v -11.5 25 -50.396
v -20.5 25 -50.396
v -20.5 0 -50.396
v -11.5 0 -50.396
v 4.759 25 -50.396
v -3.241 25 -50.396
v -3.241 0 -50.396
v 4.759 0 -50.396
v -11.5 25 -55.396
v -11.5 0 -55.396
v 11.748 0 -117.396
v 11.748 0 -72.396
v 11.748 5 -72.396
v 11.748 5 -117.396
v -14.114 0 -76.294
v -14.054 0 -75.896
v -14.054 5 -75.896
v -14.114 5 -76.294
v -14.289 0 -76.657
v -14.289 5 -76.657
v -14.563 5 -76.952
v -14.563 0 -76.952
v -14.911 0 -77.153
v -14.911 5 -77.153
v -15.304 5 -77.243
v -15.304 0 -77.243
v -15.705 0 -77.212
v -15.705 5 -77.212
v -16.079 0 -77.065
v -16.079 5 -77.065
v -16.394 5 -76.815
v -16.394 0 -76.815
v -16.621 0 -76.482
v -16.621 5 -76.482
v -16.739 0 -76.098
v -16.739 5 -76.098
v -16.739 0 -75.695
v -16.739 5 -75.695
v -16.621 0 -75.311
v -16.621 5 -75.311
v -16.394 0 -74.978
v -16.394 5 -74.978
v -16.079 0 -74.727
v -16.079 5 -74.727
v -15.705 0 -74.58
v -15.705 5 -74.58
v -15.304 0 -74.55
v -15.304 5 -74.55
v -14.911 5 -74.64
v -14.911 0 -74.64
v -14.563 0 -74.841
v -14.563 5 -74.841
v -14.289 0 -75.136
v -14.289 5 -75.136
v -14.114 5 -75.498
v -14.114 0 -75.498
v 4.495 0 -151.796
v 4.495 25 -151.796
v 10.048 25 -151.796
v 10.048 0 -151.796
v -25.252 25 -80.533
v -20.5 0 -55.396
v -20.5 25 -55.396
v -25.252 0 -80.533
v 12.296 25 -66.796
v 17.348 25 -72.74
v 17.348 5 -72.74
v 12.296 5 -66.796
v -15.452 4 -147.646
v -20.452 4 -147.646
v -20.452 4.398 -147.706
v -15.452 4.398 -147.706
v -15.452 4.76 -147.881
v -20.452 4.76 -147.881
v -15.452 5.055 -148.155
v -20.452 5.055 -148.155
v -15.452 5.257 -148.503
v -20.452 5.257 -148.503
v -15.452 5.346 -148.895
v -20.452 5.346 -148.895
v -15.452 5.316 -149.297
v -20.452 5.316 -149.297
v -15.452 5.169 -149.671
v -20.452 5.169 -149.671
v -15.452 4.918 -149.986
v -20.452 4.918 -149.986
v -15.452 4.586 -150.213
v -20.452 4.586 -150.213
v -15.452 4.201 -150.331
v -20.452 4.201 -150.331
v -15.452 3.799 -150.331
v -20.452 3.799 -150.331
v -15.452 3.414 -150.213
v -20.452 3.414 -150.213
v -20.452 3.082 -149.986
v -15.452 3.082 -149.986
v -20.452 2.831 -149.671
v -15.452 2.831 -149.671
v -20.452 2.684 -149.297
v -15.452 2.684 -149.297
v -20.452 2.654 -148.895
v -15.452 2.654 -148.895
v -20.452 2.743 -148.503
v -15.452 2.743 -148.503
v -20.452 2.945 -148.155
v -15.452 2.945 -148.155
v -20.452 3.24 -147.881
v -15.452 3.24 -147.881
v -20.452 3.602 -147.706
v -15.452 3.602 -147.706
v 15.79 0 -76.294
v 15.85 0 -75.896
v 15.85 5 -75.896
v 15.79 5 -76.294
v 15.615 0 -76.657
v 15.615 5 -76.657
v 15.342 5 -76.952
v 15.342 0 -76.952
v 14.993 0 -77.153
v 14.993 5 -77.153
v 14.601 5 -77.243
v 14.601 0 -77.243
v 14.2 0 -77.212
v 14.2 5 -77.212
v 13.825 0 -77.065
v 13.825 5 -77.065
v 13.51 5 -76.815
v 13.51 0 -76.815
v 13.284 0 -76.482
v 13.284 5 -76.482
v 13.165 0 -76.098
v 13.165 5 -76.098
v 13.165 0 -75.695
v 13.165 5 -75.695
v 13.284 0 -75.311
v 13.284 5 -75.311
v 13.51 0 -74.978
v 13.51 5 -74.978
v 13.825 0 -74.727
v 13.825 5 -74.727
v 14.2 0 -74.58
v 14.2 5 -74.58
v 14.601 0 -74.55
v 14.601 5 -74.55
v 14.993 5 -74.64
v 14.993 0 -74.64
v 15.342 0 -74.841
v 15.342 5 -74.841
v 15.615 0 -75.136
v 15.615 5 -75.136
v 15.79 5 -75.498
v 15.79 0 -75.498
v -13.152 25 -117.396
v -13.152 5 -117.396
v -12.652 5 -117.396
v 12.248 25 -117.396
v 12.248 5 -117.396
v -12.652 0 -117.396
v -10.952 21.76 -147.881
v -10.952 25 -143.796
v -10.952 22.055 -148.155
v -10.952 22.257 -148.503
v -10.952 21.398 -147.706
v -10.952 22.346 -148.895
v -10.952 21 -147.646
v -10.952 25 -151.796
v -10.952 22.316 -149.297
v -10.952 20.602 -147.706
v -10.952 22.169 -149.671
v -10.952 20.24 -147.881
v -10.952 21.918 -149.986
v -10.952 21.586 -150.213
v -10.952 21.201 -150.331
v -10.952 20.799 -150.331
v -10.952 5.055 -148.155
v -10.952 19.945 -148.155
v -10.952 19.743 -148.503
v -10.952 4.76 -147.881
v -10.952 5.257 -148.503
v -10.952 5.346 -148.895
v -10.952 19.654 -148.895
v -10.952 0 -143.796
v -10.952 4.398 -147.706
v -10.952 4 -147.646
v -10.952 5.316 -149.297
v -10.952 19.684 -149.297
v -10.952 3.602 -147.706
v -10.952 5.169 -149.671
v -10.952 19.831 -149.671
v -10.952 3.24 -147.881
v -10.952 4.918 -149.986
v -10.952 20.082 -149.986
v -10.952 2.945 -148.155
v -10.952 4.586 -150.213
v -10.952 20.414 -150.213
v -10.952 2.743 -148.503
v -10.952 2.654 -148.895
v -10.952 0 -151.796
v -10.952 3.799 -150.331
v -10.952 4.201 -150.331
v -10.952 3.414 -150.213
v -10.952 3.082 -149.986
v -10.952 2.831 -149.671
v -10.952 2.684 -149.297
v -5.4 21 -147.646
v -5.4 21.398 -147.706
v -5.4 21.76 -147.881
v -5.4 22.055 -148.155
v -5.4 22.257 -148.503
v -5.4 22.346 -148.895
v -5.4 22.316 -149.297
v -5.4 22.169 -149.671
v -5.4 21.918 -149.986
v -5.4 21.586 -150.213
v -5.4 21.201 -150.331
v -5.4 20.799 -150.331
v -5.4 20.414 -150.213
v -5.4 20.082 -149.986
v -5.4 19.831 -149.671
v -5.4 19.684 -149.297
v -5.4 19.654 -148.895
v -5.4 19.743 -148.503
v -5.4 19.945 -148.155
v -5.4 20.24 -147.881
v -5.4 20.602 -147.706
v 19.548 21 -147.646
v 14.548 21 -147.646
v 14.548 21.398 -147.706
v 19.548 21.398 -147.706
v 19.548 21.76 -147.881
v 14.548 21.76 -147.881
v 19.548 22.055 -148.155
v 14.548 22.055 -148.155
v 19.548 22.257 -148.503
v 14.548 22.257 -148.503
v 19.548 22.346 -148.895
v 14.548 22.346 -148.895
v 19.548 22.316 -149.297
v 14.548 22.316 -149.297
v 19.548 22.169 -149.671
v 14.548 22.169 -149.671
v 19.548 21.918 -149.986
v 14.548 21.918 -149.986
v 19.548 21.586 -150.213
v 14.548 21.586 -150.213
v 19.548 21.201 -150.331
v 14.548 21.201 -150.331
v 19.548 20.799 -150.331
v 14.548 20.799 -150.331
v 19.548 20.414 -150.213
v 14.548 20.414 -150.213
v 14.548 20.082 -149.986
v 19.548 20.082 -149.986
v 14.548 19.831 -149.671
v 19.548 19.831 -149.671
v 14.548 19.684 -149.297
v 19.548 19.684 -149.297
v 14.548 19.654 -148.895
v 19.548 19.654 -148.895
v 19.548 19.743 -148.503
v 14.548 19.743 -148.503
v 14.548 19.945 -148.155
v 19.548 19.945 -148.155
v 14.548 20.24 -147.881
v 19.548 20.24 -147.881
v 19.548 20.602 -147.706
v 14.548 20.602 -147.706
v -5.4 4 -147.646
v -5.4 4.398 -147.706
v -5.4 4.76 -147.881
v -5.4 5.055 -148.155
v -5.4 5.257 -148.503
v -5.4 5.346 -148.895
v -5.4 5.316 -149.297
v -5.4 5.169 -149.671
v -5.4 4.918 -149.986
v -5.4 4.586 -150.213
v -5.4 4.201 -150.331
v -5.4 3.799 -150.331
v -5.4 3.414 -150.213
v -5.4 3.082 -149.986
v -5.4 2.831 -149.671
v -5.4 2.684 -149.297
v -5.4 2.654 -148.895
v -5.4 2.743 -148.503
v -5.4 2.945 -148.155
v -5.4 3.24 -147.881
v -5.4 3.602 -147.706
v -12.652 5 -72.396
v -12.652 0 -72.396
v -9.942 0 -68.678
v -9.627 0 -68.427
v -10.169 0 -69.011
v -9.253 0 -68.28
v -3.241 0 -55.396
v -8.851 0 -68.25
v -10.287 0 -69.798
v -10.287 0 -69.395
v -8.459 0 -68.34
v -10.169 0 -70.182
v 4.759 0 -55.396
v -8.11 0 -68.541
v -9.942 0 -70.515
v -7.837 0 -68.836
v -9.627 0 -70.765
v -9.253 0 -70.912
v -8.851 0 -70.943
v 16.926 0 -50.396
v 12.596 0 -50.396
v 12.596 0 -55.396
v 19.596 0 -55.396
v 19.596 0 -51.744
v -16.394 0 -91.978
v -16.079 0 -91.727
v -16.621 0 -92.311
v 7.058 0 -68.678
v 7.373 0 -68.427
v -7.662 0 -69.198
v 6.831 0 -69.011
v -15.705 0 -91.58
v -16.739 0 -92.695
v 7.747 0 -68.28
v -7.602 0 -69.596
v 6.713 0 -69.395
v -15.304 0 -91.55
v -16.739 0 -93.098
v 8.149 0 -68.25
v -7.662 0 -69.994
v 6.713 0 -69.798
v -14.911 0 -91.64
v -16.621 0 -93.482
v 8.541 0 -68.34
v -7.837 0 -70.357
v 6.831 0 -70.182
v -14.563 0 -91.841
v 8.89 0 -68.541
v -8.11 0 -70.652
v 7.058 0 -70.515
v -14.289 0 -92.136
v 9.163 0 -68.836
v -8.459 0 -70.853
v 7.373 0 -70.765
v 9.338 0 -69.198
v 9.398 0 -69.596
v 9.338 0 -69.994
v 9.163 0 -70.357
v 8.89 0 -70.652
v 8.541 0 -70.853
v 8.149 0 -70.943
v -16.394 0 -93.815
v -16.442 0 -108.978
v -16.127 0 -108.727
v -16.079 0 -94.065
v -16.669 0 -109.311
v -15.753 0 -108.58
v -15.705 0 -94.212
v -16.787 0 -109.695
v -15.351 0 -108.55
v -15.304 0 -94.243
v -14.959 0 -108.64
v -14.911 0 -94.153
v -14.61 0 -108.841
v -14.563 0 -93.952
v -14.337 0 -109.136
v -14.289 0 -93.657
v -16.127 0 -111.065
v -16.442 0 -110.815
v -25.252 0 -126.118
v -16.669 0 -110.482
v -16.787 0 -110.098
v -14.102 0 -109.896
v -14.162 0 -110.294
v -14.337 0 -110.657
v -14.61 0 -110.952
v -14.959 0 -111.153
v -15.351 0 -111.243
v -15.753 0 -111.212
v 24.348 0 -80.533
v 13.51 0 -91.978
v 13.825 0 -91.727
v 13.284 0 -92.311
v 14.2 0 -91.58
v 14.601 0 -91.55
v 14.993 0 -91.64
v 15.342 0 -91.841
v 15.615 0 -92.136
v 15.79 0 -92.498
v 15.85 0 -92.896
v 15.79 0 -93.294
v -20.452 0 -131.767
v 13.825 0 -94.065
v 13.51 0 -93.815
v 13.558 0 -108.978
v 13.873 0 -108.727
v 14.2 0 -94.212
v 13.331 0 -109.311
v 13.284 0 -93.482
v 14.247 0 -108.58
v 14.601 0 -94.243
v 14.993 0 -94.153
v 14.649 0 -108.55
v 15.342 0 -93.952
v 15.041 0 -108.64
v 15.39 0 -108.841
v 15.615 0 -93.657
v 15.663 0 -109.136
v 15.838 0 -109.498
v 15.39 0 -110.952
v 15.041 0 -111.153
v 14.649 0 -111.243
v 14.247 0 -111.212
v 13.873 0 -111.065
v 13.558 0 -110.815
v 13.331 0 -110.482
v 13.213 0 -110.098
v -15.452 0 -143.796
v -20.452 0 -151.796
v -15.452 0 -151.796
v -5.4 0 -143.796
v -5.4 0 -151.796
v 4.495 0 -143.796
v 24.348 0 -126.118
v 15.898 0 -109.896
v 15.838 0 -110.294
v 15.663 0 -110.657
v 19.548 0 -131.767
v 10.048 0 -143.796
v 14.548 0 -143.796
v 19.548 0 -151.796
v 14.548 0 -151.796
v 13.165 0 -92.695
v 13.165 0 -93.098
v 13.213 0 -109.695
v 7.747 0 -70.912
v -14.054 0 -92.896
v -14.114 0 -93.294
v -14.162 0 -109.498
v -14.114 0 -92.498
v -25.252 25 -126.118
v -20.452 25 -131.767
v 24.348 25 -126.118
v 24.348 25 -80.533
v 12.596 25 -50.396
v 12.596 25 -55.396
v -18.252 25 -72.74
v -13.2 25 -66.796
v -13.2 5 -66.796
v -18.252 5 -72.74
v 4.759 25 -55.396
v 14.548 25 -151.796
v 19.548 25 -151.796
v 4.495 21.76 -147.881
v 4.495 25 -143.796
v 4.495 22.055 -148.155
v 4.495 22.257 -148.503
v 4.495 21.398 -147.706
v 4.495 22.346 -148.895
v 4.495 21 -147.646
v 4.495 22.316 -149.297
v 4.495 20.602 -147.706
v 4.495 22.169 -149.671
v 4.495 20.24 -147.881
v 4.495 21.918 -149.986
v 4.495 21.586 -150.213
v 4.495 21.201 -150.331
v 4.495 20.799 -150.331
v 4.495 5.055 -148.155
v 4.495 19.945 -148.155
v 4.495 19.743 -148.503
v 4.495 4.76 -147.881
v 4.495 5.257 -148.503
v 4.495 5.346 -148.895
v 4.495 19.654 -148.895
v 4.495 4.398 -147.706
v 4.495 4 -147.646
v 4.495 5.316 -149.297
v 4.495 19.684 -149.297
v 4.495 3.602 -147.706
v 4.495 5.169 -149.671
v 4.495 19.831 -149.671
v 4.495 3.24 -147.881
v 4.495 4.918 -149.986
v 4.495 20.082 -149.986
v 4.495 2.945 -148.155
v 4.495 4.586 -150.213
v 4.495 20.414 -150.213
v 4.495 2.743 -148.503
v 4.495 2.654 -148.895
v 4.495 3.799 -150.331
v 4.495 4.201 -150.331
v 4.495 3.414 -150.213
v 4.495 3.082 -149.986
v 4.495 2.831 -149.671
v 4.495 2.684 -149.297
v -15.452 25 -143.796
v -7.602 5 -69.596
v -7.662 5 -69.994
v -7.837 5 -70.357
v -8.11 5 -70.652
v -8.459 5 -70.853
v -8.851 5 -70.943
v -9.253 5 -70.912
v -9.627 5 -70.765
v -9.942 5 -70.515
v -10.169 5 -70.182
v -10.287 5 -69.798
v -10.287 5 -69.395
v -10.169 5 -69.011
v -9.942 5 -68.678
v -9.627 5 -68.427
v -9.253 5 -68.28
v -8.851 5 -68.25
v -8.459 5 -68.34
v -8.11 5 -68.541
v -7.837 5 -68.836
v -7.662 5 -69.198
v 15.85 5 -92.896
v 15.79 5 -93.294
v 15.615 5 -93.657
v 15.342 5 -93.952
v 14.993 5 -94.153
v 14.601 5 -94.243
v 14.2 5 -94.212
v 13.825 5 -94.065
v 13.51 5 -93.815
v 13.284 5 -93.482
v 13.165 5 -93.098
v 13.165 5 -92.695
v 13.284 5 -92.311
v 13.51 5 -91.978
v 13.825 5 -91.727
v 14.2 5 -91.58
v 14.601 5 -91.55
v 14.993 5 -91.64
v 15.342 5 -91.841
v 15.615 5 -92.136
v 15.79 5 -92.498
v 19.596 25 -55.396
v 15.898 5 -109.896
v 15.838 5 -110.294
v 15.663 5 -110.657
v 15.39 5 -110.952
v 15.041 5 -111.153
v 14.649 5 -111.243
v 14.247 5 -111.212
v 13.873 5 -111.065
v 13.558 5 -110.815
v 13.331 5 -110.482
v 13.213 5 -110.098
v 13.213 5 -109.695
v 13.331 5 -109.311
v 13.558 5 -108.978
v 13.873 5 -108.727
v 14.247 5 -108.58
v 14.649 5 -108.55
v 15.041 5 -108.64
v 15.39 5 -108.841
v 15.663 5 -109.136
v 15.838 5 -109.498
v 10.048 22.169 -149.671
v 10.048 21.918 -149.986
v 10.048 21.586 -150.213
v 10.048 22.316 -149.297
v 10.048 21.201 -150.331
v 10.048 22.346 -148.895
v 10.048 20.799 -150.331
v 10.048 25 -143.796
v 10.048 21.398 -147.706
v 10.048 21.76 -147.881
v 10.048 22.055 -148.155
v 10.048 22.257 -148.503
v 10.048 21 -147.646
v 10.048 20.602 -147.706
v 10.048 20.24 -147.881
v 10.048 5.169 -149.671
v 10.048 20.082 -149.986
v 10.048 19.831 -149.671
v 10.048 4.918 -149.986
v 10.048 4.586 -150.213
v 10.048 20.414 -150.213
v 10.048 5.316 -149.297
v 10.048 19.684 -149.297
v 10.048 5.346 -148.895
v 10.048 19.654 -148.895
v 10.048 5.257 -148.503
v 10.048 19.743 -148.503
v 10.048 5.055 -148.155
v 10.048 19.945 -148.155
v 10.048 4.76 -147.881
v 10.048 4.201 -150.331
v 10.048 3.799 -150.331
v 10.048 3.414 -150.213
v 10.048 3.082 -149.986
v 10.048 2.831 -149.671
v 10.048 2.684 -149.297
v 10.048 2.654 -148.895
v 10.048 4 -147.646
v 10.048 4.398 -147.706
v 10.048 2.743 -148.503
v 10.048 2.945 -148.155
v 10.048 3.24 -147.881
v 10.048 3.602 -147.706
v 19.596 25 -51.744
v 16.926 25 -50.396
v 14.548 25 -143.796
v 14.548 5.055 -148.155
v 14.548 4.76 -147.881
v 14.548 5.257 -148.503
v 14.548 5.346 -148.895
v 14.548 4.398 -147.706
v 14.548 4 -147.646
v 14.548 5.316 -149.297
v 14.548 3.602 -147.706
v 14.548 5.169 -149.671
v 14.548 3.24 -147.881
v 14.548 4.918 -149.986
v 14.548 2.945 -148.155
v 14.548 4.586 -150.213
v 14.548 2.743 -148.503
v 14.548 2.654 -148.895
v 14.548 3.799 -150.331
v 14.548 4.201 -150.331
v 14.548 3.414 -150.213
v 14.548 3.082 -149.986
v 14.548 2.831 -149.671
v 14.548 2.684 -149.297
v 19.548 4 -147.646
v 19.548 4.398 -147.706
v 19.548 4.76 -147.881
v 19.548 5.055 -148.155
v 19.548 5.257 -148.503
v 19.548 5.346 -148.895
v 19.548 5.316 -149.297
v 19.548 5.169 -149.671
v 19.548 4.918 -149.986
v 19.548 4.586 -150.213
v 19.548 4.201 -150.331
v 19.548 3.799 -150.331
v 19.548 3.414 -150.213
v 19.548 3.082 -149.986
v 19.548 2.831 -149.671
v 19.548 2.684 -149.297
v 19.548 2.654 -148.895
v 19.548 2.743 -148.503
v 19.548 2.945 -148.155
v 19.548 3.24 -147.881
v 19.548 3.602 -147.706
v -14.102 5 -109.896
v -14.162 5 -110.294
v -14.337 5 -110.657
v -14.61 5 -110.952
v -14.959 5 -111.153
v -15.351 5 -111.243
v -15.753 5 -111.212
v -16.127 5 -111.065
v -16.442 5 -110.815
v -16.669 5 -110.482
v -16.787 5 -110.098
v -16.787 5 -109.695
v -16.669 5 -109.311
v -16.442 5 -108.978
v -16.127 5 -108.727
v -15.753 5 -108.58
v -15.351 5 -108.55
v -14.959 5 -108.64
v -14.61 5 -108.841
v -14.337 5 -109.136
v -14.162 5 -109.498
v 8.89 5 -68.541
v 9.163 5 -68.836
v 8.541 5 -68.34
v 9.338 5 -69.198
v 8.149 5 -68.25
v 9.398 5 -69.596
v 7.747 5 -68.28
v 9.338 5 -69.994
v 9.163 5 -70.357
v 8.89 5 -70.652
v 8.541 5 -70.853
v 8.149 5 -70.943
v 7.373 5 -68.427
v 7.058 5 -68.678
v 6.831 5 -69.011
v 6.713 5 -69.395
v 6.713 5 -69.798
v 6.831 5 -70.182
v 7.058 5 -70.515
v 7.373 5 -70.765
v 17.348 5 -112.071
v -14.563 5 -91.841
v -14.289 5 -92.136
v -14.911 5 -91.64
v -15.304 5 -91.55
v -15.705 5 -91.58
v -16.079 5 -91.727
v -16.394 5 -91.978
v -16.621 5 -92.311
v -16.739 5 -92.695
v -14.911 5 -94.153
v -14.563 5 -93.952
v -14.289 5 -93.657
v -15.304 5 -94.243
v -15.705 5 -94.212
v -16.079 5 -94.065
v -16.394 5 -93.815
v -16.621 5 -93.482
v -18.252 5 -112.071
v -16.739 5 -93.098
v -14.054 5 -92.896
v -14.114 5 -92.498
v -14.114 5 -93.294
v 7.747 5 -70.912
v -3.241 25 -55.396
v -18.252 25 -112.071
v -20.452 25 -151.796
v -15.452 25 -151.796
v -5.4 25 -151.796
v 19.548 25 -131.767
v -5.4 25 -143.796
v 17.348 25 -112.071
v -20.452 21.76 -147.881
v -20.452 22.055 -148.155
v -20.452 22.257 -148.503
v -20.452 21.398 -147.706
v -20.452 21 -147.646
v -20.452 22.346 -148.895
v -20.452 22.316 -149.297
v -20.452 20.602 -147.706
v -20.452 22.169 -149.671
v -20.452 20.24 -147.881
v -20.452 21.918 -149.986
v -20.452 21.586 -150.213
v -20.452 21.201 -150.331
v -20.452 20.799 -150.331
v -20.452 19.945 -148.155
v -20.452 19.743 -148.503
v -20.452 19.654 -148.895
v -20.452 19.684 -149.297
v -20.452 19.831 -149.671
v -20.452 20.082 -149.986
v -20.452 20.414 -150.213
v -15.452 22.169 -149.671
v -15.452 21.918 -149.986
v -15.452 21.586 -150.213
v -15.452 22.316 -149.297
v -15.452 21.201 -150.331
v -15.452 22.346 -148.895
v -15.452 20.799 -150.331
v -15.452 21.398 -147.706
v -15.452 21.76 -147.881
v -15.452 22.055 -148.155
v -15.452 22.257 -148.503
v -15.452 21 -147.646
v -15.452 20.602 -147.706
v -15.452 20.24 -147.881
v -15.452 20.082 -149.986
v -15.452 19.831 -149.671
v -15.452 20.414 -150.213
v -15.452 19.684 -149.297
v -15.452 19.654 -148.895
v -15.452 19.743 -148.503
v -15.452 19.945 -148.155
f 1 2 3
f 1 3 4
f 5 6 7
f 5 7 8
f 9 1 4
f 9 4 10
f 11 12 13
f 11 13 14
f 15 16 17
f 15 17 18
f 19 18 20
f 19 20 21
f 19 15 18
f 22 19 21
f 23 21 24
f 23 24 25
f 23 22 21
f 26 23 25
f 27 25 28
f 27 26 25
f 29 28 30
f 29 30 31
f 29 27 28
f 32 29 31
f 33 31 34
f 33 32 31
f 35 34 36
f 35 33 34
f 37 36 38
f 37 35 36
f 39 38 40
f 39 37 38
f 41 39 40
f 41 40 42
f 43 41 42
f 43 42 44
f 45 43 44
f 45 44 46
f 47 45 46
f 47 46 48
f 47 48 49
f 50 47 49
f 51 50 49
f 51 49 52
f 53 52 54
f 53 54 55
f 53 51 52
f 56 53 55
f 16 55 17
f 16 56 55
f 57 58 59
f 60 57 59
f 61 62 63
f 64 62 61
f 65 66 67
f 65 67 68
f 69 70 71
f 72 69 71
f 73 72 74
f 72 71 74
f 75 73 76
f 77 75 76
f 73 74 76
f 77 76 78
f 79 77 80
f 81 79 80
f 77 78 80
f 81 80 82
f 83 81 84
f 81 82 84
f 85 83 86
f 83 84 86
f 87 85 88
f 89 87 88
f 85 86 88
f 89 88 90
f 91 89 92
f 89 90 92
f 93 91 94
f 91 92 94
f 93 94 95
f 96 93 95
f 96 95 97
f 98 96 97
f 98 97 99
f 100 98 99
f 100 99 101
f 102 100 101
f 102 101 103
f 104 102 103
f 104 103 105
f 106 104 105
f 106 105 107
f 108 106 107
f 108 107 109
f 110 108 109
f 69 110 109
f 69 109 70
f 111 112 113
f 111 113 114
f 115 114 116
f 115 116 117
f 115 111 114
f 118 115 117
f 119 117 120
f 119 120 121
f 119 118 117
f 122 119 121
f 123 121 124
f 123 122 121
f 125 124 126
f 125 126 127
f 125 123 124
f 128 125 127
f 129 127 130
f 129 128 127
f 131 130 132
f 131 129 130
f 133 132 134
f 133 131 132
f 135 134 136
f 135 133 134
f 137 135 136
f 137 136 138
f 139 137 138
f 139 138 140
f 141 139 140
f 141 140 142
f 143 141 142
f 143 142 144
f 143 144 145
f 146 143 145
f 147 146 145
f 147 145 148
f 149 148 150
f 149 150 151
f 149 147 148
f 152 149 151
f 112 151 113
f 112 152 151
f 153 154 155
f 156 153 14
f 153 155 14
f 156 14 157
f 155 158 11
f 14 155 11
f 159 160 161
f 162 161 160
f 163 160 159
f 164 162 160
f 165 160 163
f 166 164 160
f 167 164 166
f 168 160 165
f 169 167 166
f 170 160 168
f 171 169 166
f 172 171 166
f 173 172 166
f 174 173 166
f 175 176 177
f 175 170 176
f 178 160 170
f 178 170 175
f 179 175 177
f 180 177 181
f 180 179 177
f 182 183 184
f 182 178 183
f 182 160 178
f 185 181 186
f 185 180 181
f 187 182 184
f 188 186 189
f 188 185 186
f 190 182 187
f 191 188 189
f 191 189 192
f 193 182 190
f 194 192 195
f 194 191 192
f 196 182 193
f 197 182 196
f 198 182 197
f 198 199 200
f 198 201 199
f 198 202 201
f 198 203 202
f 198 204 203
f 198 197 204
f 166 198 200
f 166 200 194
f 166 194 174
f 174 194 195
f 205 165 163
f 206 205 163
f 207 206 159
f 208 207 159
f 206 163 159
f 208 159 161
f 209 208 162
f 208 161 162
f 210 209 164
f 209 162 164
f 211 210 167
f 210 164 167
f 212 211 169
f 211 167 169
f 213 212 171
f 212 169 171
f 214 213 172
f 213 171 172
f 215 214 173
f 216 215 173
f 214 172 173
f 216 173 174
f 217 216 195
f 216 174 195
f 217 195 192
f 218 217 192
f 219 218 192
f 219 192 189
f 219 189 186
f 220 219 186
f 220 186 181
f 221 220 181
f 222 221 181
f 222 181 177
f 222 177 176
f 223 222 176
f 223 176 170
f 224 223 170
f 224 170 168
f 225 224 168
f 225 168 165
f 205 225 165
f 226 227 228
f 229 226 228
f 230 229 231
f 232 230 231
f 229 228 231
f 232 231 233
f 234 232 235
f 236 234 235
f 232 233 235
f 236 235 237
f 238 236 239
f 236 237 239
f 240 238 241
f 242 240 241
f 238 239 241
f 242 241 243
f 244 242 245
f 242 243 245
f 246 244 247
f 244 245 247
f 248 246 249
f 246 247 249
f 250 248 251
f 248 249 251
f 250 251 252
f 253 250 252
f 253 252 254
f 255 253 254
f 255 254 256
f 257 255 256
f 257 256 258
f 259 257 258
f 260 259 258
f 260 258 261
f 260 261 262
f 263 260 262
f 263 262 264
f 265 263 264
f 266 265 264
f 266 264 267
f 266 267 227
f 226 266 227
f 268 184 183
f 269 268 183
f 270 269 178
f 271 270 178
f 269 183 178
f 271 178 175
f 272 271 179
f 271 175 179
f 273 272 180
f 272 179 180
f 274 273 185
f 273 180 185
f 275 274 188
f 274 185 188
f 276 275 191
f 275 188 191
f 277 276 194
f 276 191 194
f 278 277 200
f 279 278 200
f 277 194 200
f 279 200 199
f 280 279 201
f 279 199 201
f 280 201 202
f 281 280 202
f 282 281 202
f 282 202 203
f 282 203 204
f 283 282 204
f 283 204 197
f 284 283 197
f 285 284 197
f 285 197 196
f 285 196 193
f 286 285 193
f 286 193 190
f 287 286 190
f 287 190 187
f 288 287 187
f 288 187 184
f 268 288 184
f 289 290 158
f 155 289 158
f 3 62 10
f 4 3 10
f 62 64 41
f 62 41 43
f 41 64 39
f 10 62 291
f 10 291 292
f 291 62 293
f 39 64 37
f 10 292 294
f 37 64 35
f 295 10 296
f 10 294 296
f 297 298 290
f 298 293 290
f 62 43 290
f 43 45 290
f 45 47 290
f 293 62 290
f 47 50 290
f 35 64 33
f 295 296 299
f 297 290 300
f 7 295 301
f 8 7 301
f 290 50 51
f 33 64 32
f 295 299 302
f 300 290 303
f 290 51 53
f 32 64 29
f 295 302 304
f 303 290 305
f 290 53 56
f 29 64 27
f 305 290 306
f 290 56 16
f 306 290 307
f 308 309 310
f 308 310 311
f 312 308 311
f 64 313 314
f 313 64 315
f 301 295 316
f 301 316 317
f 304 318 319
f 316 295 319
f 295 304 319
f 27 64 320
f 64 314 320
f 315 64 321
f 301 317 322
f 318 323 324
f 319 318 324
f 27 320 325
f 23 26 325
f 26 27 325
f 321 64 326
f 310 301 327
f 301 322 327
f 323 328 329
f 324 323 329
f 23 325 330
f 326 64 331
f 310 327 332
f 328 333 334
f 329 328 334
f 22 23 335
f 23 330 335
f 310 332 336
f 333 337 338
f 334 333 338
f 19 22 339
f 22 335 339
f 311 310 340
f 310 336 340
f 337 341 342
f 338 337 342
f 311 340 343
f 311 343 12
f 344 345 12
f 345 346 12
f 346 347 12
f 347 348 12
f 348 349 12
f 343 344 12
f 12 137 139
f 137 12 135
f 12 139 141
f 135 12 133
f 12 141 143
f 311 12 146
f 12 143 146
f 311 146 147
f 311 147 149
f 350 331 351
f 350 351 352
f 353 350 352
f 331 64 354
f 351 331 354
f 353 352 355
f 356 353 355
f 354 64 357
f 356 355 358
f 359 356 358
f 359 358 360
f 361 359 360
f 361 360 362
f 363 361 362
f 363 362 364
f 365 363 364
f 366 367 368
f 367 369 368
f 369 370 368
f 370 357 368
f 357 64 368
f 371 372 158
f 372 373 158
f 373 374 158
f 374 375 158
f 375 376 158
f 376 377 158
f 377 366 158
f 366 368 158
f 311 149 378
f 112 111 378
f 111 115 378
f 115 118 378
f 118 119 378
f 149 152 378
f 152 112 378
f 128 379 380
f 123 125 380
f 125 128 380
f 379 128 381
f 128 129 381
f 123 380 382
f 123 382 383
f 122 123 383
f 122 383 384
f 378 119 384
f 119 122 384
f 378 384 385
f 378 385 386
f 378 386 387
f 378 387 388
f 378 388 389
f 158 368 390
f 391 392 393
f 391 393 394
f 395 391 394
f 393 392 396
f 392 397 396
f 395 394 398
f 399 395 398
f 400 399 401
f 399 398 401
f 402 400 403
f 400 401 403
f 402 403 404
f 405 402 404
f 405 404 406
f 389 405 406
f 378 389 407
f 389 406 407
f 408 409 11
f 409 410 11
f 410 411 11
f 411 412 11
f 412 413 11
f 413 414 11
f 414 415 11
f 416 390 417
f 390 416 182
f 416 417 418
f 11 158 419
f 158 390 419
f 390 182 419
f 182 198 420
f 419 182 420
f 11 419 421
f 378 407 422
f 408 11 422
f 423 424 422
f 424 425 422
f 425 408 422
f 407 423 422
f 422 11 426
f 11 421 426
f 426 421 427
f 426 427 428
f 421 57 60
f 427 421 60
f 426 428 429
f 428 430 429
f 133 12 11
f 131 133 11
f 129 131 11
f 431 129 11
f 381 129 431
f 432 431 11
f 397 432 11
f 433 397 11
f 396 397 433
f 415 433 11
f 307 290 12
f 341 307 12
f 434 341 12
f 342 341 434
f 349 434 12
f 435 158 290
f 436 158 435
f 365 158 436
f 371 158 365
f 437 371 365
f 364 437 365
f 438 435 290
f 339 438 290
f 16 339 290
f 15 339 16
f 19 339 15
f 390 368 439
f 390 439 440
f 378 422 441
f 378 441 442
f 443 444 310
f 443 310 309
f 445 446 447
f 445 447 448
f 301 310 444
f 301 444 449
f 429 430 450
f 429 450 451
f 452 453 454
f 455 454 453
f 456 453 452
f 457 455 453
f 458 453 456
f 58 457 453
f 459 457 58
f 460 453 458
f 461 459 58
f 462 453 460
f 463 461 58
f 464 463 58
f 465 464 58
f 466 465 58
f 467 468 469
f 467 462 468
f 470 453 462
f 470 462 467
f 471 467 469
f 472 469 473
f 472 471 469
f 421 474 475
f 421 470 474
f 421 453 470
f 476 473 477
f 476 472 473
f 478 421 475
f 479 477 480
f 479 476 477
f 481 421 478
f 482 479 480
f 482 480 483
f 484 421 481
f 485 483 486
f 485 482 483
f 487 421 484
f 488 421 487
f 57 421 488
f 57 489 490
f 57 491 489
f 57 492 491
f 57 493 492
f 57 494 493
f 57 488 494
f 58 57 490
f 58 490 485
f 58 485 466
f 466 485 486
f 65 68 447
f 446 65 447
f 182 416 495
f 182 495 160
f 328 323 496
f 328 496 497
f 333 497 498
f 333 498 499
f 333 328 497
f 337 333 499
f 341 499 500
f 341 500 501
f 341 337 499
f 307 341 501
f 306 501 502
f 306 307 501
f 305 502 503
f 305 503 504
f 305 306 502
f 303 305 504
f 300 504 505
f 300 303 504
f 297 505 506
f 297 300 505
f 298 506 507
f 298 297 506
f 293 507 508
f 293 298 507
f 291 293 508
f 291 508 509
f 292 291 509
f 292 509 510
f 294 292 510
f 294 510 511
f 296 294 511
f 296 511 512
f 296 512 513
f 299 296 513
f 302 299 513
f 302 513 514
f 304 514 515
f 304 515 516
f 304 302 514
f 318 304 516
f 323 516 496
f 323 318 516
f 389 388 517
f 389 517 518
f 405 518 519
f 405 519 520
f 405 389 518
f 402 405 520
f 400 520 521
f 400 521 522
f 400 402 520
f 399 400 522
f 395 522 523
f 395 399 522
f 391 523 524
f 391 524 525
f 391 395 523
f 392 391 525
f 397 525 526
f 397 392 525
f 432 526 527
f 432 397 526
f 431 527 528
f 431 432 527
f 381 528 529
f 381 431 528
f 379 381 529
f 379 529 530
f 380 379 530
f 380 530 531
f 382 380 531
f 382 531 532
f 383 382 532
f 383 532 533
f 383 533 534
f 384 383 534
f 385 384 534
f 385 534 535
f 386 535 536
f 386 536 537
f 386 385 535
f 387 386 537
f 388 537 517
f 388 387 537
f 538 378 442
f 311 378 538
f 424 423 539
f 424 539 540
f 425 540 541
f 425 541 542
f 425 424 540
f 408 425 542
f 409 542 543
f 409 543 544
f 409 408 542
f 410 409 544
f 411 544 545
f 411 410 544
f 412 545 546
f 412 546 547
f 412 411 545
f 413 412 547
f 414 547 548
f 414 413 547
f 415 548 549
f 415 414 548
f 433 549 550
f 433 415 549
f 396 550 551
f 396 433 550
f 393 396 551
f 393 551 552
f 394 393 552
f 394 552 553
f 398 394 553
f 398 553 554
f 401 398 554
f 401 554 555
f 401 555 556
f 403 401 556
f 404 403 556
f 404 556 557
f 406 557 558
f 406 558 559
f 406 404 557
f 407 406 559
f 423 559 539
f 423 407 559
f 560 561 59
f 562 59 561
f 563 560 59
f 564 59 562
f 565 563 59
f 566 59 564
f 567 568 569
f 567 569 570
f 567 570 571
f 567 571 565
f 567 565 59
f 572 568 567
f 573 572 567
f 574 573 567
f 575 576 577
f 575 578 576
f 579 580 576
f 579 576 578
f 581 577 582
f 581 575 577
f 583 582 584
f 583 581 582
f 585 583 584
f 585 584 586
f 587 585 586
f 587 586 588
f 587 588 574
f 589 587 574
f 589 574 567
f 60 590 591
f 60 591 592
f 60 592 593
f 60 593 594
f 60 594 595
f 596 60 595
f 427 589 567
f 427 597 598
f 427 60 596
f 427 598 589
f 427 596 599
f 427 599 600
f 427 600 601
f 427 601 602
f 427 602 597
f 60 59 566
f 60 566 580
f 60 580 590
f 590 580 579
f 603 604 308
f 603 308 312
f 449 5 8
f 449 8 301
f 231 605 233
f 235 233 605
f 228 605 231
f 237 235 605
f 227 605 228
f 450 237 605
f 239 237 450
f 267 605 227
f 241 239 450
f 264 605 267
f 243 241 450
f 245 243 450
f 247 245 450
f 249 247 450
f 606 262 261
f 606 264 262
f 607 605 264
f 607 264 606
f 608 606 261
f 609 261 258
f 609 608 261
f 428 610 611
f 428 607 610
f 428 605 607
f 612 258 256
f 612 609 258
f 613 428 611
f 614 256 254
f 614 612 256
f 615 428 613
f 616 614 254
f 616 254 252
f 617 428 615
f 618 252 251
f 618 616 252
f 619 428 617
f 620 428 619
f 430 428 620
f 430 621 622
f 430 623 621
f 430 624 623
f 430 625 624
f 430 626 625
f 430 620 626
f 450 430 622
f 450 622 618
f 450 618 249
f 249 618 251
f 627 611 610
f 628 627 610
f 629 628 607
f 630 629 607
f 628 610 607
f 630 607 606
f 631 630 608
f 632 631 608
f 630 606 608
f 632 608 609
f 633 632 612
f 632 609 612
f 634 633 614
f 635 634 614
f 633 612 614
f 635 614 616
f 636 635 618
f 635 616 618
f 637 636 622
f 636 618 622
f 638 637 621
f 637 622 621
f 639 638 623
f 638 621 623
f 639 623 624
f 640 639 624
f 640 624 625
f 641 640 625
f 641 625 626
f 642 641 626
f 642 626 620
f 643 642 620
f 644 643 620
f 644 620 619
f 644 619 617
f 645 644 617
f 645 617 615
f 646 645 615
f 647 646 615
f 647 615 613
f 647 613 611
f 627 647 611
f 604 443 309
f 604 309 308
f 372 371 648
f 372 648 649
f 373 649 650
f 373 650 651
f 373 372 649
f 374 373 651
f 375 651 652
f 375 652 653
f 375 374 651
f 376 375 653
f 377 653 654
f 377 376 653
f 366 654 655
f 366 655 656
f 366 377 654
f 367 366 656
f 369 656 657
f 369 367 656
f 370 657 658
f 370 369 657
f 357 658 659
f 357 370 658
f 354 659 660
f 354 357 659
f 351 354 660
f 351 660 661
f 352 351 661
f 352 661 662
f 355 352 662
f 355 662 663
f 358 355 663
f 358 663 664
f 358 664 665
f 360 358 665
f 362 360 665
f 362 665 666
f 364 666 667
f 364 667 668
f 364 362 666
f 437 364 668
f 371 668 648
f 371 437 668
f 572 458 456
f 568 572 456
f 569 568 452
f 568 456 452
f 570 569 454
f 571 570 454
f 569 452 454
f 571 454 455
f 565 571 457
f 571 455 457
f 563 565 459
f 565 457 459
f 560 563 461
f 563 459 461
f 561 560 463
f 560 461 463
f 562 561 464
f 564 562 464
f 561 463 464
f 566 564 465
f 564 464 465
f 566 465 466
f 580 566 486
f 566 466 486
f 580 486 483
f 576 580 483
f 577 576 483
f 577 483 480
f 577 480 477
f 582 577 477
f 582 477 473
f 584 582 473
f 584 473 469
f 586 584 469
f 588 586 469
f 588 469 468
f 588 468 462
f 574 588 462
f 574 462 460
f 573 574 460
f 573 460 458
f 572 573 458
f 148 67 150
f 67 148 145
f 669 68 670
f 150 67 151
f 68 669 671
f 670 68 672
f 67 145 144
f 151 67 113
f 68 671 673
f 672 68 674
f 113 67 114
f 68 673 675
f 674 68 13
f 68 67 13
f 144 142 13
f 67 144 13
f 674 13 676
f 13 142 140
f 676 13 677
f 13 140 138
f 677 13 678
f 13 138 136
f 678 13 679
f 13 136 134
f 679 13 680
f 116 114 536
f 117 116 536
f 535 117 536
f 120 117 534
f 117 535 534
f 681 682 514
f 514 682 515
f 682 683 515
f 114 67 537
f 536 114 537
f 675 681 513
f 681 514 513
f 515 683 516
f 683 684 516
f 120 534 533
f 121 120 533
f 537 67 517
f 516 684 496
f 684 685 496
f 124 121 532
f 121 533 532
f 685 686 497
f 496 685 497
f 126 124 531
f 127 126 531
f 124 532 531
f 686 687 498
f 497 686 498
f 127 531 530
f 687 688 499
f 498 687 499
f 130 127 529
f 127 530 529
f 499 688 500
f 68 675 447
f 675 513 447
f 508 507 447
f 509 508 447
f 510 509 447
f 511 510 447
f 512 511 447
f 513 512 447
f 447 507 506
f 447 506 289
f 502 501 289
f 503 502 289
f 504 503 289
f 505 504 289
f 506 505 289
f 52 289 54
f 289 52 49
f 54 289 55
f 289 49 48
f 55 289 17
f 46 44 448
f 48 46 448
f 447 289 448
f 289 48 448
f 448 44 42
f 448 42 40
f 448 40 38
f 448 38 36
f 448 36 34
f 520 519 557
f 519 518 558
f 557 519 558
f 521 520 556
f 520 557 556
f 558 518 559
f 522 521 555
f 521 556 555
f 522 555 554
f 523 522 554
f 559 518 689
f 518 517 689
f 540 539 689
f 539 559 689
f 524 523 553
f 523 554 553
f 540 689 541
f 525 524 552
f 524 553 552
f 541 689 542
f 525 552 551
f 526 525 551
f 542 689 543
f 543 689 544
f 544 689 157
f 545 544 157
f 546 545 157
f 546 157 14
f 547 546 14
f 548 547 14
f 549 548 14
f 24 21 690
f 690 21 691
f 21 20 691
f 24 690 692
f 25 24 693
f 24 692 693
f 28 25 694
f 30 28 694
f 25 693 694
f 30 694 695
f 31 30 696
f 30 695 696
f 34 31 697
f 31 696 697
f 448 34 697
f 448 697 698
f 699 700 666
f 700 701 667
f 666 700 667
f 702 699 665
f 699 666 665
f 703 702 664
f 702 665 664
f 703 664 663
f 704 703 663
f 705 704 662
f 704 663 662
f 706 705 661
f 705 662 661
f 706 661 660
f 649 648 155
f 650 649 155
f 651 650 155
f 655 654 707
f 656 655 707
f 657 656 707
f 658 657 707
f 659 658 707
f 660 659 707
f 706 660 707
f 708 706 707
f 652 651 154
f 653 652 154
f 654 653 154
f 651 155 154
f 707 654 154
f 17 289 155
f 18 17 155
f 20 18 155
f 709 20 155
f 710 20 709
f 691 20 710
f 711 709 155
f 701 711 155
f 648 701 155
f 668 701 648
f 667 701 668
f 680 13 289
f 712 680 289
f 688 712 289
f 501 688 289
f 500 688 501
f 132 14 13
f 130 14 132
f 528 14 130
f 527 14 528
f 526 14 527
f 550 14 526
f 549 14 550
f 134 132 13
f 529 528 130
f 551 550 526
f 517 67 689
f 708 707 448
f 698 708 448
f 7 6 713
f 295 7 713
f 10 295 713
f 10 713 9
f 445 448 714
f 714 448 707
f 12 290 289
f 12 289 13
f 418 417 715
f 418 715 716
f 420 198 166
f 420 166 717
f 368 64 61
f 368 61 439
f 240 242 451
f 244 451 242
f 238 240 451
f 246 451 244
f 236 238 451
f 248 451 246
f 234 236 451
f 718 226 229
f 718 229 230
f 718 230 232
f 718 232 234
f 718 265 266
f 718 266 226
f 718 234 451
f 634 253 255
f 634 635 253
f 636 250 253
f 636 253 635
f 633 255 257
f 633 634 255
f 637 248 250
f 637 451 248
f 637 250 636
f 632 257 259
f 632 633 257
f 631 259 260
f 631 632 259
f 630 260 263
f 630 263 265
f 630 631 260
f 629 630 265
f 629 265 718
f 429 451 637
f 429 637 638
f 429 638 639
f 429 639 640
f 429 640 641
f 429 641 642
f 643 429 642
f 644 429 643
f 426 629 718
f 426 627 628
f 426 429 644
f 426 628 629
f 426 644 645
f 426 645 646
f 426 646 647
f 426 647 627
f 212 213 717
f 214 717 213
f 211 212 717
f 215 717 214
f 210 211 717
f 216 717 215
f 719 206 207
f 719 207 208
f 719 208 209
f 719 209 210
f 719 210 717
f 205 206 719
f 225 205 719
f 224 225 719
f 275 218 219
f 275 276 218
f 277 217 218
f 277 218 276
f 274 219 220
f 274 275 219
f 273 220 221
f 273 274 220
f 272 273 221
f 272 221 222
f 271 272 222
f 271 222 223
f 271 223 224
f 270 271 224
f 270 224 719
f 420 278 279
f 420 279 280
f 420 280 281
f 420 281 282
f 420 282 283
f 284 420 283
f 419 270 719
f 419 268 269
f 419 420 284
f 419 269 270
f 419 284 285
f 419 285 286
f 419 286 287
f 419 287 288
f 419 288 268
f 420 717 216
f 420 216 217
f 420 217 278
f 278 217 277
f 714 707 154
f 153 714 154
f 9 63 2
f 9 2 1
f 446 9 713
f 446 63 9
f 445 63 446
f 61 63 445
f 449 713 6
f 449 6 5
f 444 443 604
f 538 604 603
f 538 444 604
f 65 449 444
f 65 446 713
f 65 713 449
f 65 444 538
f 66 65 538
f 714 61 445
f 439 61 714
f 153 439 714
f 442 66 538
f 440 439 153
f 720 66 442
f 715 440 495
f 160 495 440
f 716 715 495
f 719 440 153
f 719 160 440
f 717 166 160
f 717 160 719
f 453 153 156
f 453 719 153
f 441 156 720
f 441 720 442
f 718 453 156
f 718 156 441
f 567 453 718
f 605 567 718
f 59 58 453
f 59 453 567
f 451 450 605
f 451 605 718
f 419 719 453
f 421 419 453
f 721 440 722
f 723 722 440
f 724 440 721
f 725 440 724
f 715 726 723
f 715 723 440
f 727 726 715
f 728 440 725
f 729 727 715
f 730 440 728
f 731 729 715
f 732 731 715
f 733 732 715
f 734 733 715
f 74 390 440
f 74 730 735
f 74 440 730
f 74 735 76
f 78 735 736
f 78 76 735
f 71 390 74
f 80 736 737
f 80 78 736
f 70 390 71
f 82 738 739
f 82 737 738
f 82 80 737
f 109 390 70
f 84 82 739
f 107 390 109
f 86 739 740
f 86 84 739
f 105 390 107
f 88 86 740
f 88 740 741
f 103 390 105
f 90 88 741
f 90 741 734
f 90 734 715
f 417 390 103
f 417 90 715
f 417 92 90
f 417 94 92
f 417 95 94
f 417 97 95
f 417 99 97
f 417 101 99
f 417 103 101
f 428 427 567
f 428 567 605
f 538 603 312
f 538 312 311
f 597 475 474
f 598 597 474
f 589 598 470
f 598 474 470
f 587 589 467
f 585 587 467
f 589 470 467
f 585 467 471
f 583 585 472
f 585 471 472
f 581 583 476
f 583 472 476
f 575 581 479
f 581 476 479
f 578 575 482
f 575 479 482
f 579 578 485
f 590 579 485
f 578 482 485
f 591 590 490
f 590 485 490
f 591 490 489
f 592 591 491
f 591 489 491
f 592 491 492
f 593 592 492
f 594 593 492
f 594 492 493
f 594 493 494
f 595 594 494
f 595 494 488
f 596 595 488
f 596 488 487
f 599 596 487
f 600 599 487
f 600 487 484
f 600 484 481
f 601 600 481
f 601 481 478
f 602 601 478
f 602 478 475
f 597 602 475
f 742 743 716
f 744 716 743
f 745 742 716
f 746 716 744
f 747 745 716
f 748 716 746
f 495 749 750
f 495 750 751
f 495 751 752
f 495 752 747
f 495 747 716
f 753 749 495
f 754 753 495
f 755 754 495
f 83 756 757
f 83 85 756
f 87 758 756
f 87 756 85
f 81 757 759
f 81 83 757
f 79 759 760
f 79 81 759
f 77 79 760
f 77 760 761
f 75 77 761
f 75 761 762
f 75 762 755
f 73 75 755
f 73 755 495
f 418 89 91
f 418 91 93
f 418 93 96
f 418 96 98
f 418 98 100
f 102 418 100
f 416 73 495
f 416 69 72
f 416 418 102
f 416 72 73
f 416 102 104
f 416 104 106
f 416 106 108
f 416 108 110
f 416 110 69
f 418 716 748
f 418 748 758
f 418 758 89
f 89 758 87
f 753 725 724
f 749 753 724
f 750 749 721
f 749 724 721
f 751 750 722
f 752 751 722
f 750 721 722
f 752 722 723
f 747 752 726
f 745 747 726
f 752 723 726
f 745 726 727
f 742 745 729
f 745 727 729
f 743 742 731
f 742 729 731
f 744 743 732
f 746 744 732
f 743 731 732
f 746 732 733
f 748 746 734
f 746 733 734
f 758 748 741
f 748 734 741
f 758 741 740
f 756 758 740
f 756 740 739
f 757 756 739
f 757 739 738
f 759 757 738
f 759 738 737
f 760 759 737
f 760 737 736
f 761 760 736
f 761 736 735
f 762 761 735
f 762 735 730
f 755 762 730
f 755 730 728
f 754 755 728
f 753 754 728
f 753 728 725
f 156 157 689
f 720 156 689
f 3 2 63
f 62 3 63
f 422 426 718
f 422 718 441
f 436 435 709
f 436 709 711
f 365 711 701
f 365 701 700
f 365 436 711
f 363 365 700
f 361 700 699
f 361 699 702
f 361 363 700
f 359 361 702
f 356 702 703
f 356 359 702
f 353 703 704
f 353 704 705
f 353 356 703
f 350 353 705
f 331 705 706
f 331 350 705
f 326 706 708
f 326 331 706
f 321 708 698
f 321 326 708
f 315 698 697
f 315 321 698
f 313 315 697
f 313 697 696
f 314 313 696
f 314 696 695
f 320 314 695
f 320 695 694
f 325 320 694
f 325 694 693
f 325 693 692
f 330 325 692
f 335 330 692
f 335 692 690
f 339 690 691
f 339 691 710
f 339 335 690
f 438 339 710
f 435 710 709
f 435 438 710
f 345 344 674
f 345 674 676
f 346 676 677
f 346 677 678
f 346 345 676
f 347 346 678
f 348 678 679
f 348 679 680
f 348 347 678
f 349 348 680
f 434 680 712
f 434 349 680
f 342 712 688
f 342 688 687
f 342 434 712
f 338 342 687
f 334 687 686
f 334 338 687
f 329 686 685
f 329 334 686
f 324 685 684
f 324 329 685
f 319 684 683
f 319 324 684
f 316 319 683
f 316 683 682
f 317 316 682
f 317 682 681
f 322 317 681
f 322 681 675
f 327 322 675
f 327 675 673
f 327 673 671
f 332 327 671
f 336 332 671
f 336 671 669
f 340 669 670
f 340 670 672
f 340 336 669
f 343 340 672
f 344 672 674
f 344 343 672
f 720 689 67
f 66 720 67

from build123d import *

# Parameters (mm, degrees)
SZKIC1_W                    = 24.4
SZKIC1_H                    = 45
SZKIC1_R                    = 1.35
DODANIE_WYCI_GNI_CIE1_DEPTH = 5
DODANIE_WYCI_GNI_CIE2_DEPTH = 25
SZKIC8_W                    = 8
SZKIC8_H                    = 5
SZKIC8_W_2                  = 9
DODANIE_WYCI_GNI_CIE3_DEPTH = 25
SZKIC7_R                    = 1.35
WYTNIJ_WYCI_GNI_CIE8_DEPTH  = 161.231596245


with BuildPart() as part:
    # Szkic1 → Dodanie-wyci_gni_cie1 (new body)
    with BuildSketch(Plane(origin=(0, 0, 0), x_dir=(1, 0, 0), z_dir=(0, 1, 0))):
        Polygon((14.547789553, 143.7963255), (10.047789553, 143.7963255), (10.047789553, 151.7963255), (4.495079248, 151.7963255), (4.495079248, 143.7963255), (-5.399500142, 143.7963255), (-5.399500142, 151.7963255), (-10.952210447, 151.7963255), (-10.952210447, 143.7963255), (-15.452210447, 143.7963255), (-15.452210447, 151.7963255), (-20.452210447, 151.7963255), (-20.452210447, 131.76713902), (-25.252210447, 126.117958863), (-25.252210447, 80.533497461), (-20.5, 55.3963255), (19.595579106, 55.3963255), (24.347789553, 80.533497461), (24.347789553, 126.117958863), (19.547789553, 131.76713902), (19.547789553, 151.7963255), (14.547789553, 151.7963255), align=None)
        with Locations((-0.452210447, 94.8963255)):
            Rectangle(SZKIC1_W, SZKIC1_H, mode=Mode.SUBTRACT)
        with Locations((14.547789553, 109.8963255)):
            Circle(SZKIC1_R, mode=Mode.SUBTRACT)
        with Locations((-15.404420894, 75.8963255)):
            Circle(SZKIC1_R, mode=Mode.SUBTRACT)
        with Locations((-8.952210447, 69.5963255)):
            Circle(SZKIC1_R, mode=Mode.SUBTRACT)
        with Locations((-15.404420894, 92.8963255)):
            Circle(SZKIC1_R, mode=Mode.SUBTRACT)
        with Locations((8.047789553, 69.5963255)):
            Circle(SZKIC1_R, mode=Mode.SUBTRACT)
        with Locations((14.5, 75.8963255)):
            Circle(SZKIC1_R, mode=Mode.SUBTRACT)
        with Locations((14.5, 92.8963255)):
            Circle(SZKIC1_R, mode=Mode.SUBTRACT)
        with Locations((-15.452210447, 109.8963255)):
            Circle(SZKIC1_R, mode=Mode.SUBTRACT)
    extrude(amount=DODANIE_WYCI_GNI_CIE1_DEPTH)

    # Szkic1_3 → Dodanie-wyci_gni_cie2 (add)
    with BuildSketch(Plane(origin=(0, 0, 0), x_dir=(1, 0, 0), z_dir=(0, 1, 0))):
        Polygon((14.547789553, 143.7963255), (10.047789553, 143.7963255), (10.047789553, 151.7963255), (4.495079248, 151.7963255), (4.495079248, 143.7963255), (-5.399500142, 143.7963255), (-5.399500142, 151.7963255), (-10.952210447, 151.7963255), (-10.952210447, 143.7963255), (-15.452210447, 143.7963255), (-15.452210447, 151.7963255), (-20.452210447, 151.7963255), (-20.452210447, 131.76713902), (-25.252210447, 126.117958863), (-25.252210447, 80.533497461), (-20.5, 55.3963255), (19.595579106, 55.3963255), (24.347789553, 80.533497461), (24.347789553, 126.117958863), (19.547789553, 131.76713902), (19.547789553, 151.7963255), (14.547789553, 151.7963255), align=None)
        Polygon((-13.152210447, 117.3963255), (-12.652210447, 117.3963255), (11.747789553, 117.3963255), (12.247789553, 117.3963255), (17.347789553, 112.070622628), (17.347789553, 72.740102496), (12.295579106, 66.7963255), (-13.2, 66.7963255), (-18.252210447, 72.740102496), (-18.252210447, 112.070622628), align=None, mode=Mode.SUBTRACT)
    extrude(amount=DODANIE_WYCI_GNI_CIE2_DEPTH)

    # Szkic8 → Dodanie-wyci_gni_cie3 (add)
    with BuildSketch(Plane(origin=(0, 25, 0), x_dir=(1, 0, 0), z_dir=(0, 1, 0))):
        Polygon((19.595579106, 51.744454691), (19.595579106, 55.3963255), (12.595579106, 55.3963255), (12.595579106, 50.3963255), (16.925579106, 50.3963255), align=None)
        with Locations((0.758846465, 52.8963255)):
            Rectangle(SZKIC8_W, SZKIC8_H)
        with Locations((-16, 52.8963255)):
            Rectangle(SZKIC8_W_2, SZKIC8_H)
    extrude(amount=-DODANIE_WYCI_GNI_CIE3_DEPTH)

    # Szkic7 → Wytnij-wyci_gni_cie8 (cut, through all)
    with BuildSketch(Plane.ZY.offset(20.452210447)):
        with Locations((-148.9963255, 21)):
            Circle(SZKIC7_R)
        with Locations((-148.9963255, 4)):
            Circle(SZKIC7_R)
    extrude(amount=-WYTNIJ_WYCI_GNI_CIE8_DEPTH, mode=Mode.SUBTRACT)


solid = part.part
